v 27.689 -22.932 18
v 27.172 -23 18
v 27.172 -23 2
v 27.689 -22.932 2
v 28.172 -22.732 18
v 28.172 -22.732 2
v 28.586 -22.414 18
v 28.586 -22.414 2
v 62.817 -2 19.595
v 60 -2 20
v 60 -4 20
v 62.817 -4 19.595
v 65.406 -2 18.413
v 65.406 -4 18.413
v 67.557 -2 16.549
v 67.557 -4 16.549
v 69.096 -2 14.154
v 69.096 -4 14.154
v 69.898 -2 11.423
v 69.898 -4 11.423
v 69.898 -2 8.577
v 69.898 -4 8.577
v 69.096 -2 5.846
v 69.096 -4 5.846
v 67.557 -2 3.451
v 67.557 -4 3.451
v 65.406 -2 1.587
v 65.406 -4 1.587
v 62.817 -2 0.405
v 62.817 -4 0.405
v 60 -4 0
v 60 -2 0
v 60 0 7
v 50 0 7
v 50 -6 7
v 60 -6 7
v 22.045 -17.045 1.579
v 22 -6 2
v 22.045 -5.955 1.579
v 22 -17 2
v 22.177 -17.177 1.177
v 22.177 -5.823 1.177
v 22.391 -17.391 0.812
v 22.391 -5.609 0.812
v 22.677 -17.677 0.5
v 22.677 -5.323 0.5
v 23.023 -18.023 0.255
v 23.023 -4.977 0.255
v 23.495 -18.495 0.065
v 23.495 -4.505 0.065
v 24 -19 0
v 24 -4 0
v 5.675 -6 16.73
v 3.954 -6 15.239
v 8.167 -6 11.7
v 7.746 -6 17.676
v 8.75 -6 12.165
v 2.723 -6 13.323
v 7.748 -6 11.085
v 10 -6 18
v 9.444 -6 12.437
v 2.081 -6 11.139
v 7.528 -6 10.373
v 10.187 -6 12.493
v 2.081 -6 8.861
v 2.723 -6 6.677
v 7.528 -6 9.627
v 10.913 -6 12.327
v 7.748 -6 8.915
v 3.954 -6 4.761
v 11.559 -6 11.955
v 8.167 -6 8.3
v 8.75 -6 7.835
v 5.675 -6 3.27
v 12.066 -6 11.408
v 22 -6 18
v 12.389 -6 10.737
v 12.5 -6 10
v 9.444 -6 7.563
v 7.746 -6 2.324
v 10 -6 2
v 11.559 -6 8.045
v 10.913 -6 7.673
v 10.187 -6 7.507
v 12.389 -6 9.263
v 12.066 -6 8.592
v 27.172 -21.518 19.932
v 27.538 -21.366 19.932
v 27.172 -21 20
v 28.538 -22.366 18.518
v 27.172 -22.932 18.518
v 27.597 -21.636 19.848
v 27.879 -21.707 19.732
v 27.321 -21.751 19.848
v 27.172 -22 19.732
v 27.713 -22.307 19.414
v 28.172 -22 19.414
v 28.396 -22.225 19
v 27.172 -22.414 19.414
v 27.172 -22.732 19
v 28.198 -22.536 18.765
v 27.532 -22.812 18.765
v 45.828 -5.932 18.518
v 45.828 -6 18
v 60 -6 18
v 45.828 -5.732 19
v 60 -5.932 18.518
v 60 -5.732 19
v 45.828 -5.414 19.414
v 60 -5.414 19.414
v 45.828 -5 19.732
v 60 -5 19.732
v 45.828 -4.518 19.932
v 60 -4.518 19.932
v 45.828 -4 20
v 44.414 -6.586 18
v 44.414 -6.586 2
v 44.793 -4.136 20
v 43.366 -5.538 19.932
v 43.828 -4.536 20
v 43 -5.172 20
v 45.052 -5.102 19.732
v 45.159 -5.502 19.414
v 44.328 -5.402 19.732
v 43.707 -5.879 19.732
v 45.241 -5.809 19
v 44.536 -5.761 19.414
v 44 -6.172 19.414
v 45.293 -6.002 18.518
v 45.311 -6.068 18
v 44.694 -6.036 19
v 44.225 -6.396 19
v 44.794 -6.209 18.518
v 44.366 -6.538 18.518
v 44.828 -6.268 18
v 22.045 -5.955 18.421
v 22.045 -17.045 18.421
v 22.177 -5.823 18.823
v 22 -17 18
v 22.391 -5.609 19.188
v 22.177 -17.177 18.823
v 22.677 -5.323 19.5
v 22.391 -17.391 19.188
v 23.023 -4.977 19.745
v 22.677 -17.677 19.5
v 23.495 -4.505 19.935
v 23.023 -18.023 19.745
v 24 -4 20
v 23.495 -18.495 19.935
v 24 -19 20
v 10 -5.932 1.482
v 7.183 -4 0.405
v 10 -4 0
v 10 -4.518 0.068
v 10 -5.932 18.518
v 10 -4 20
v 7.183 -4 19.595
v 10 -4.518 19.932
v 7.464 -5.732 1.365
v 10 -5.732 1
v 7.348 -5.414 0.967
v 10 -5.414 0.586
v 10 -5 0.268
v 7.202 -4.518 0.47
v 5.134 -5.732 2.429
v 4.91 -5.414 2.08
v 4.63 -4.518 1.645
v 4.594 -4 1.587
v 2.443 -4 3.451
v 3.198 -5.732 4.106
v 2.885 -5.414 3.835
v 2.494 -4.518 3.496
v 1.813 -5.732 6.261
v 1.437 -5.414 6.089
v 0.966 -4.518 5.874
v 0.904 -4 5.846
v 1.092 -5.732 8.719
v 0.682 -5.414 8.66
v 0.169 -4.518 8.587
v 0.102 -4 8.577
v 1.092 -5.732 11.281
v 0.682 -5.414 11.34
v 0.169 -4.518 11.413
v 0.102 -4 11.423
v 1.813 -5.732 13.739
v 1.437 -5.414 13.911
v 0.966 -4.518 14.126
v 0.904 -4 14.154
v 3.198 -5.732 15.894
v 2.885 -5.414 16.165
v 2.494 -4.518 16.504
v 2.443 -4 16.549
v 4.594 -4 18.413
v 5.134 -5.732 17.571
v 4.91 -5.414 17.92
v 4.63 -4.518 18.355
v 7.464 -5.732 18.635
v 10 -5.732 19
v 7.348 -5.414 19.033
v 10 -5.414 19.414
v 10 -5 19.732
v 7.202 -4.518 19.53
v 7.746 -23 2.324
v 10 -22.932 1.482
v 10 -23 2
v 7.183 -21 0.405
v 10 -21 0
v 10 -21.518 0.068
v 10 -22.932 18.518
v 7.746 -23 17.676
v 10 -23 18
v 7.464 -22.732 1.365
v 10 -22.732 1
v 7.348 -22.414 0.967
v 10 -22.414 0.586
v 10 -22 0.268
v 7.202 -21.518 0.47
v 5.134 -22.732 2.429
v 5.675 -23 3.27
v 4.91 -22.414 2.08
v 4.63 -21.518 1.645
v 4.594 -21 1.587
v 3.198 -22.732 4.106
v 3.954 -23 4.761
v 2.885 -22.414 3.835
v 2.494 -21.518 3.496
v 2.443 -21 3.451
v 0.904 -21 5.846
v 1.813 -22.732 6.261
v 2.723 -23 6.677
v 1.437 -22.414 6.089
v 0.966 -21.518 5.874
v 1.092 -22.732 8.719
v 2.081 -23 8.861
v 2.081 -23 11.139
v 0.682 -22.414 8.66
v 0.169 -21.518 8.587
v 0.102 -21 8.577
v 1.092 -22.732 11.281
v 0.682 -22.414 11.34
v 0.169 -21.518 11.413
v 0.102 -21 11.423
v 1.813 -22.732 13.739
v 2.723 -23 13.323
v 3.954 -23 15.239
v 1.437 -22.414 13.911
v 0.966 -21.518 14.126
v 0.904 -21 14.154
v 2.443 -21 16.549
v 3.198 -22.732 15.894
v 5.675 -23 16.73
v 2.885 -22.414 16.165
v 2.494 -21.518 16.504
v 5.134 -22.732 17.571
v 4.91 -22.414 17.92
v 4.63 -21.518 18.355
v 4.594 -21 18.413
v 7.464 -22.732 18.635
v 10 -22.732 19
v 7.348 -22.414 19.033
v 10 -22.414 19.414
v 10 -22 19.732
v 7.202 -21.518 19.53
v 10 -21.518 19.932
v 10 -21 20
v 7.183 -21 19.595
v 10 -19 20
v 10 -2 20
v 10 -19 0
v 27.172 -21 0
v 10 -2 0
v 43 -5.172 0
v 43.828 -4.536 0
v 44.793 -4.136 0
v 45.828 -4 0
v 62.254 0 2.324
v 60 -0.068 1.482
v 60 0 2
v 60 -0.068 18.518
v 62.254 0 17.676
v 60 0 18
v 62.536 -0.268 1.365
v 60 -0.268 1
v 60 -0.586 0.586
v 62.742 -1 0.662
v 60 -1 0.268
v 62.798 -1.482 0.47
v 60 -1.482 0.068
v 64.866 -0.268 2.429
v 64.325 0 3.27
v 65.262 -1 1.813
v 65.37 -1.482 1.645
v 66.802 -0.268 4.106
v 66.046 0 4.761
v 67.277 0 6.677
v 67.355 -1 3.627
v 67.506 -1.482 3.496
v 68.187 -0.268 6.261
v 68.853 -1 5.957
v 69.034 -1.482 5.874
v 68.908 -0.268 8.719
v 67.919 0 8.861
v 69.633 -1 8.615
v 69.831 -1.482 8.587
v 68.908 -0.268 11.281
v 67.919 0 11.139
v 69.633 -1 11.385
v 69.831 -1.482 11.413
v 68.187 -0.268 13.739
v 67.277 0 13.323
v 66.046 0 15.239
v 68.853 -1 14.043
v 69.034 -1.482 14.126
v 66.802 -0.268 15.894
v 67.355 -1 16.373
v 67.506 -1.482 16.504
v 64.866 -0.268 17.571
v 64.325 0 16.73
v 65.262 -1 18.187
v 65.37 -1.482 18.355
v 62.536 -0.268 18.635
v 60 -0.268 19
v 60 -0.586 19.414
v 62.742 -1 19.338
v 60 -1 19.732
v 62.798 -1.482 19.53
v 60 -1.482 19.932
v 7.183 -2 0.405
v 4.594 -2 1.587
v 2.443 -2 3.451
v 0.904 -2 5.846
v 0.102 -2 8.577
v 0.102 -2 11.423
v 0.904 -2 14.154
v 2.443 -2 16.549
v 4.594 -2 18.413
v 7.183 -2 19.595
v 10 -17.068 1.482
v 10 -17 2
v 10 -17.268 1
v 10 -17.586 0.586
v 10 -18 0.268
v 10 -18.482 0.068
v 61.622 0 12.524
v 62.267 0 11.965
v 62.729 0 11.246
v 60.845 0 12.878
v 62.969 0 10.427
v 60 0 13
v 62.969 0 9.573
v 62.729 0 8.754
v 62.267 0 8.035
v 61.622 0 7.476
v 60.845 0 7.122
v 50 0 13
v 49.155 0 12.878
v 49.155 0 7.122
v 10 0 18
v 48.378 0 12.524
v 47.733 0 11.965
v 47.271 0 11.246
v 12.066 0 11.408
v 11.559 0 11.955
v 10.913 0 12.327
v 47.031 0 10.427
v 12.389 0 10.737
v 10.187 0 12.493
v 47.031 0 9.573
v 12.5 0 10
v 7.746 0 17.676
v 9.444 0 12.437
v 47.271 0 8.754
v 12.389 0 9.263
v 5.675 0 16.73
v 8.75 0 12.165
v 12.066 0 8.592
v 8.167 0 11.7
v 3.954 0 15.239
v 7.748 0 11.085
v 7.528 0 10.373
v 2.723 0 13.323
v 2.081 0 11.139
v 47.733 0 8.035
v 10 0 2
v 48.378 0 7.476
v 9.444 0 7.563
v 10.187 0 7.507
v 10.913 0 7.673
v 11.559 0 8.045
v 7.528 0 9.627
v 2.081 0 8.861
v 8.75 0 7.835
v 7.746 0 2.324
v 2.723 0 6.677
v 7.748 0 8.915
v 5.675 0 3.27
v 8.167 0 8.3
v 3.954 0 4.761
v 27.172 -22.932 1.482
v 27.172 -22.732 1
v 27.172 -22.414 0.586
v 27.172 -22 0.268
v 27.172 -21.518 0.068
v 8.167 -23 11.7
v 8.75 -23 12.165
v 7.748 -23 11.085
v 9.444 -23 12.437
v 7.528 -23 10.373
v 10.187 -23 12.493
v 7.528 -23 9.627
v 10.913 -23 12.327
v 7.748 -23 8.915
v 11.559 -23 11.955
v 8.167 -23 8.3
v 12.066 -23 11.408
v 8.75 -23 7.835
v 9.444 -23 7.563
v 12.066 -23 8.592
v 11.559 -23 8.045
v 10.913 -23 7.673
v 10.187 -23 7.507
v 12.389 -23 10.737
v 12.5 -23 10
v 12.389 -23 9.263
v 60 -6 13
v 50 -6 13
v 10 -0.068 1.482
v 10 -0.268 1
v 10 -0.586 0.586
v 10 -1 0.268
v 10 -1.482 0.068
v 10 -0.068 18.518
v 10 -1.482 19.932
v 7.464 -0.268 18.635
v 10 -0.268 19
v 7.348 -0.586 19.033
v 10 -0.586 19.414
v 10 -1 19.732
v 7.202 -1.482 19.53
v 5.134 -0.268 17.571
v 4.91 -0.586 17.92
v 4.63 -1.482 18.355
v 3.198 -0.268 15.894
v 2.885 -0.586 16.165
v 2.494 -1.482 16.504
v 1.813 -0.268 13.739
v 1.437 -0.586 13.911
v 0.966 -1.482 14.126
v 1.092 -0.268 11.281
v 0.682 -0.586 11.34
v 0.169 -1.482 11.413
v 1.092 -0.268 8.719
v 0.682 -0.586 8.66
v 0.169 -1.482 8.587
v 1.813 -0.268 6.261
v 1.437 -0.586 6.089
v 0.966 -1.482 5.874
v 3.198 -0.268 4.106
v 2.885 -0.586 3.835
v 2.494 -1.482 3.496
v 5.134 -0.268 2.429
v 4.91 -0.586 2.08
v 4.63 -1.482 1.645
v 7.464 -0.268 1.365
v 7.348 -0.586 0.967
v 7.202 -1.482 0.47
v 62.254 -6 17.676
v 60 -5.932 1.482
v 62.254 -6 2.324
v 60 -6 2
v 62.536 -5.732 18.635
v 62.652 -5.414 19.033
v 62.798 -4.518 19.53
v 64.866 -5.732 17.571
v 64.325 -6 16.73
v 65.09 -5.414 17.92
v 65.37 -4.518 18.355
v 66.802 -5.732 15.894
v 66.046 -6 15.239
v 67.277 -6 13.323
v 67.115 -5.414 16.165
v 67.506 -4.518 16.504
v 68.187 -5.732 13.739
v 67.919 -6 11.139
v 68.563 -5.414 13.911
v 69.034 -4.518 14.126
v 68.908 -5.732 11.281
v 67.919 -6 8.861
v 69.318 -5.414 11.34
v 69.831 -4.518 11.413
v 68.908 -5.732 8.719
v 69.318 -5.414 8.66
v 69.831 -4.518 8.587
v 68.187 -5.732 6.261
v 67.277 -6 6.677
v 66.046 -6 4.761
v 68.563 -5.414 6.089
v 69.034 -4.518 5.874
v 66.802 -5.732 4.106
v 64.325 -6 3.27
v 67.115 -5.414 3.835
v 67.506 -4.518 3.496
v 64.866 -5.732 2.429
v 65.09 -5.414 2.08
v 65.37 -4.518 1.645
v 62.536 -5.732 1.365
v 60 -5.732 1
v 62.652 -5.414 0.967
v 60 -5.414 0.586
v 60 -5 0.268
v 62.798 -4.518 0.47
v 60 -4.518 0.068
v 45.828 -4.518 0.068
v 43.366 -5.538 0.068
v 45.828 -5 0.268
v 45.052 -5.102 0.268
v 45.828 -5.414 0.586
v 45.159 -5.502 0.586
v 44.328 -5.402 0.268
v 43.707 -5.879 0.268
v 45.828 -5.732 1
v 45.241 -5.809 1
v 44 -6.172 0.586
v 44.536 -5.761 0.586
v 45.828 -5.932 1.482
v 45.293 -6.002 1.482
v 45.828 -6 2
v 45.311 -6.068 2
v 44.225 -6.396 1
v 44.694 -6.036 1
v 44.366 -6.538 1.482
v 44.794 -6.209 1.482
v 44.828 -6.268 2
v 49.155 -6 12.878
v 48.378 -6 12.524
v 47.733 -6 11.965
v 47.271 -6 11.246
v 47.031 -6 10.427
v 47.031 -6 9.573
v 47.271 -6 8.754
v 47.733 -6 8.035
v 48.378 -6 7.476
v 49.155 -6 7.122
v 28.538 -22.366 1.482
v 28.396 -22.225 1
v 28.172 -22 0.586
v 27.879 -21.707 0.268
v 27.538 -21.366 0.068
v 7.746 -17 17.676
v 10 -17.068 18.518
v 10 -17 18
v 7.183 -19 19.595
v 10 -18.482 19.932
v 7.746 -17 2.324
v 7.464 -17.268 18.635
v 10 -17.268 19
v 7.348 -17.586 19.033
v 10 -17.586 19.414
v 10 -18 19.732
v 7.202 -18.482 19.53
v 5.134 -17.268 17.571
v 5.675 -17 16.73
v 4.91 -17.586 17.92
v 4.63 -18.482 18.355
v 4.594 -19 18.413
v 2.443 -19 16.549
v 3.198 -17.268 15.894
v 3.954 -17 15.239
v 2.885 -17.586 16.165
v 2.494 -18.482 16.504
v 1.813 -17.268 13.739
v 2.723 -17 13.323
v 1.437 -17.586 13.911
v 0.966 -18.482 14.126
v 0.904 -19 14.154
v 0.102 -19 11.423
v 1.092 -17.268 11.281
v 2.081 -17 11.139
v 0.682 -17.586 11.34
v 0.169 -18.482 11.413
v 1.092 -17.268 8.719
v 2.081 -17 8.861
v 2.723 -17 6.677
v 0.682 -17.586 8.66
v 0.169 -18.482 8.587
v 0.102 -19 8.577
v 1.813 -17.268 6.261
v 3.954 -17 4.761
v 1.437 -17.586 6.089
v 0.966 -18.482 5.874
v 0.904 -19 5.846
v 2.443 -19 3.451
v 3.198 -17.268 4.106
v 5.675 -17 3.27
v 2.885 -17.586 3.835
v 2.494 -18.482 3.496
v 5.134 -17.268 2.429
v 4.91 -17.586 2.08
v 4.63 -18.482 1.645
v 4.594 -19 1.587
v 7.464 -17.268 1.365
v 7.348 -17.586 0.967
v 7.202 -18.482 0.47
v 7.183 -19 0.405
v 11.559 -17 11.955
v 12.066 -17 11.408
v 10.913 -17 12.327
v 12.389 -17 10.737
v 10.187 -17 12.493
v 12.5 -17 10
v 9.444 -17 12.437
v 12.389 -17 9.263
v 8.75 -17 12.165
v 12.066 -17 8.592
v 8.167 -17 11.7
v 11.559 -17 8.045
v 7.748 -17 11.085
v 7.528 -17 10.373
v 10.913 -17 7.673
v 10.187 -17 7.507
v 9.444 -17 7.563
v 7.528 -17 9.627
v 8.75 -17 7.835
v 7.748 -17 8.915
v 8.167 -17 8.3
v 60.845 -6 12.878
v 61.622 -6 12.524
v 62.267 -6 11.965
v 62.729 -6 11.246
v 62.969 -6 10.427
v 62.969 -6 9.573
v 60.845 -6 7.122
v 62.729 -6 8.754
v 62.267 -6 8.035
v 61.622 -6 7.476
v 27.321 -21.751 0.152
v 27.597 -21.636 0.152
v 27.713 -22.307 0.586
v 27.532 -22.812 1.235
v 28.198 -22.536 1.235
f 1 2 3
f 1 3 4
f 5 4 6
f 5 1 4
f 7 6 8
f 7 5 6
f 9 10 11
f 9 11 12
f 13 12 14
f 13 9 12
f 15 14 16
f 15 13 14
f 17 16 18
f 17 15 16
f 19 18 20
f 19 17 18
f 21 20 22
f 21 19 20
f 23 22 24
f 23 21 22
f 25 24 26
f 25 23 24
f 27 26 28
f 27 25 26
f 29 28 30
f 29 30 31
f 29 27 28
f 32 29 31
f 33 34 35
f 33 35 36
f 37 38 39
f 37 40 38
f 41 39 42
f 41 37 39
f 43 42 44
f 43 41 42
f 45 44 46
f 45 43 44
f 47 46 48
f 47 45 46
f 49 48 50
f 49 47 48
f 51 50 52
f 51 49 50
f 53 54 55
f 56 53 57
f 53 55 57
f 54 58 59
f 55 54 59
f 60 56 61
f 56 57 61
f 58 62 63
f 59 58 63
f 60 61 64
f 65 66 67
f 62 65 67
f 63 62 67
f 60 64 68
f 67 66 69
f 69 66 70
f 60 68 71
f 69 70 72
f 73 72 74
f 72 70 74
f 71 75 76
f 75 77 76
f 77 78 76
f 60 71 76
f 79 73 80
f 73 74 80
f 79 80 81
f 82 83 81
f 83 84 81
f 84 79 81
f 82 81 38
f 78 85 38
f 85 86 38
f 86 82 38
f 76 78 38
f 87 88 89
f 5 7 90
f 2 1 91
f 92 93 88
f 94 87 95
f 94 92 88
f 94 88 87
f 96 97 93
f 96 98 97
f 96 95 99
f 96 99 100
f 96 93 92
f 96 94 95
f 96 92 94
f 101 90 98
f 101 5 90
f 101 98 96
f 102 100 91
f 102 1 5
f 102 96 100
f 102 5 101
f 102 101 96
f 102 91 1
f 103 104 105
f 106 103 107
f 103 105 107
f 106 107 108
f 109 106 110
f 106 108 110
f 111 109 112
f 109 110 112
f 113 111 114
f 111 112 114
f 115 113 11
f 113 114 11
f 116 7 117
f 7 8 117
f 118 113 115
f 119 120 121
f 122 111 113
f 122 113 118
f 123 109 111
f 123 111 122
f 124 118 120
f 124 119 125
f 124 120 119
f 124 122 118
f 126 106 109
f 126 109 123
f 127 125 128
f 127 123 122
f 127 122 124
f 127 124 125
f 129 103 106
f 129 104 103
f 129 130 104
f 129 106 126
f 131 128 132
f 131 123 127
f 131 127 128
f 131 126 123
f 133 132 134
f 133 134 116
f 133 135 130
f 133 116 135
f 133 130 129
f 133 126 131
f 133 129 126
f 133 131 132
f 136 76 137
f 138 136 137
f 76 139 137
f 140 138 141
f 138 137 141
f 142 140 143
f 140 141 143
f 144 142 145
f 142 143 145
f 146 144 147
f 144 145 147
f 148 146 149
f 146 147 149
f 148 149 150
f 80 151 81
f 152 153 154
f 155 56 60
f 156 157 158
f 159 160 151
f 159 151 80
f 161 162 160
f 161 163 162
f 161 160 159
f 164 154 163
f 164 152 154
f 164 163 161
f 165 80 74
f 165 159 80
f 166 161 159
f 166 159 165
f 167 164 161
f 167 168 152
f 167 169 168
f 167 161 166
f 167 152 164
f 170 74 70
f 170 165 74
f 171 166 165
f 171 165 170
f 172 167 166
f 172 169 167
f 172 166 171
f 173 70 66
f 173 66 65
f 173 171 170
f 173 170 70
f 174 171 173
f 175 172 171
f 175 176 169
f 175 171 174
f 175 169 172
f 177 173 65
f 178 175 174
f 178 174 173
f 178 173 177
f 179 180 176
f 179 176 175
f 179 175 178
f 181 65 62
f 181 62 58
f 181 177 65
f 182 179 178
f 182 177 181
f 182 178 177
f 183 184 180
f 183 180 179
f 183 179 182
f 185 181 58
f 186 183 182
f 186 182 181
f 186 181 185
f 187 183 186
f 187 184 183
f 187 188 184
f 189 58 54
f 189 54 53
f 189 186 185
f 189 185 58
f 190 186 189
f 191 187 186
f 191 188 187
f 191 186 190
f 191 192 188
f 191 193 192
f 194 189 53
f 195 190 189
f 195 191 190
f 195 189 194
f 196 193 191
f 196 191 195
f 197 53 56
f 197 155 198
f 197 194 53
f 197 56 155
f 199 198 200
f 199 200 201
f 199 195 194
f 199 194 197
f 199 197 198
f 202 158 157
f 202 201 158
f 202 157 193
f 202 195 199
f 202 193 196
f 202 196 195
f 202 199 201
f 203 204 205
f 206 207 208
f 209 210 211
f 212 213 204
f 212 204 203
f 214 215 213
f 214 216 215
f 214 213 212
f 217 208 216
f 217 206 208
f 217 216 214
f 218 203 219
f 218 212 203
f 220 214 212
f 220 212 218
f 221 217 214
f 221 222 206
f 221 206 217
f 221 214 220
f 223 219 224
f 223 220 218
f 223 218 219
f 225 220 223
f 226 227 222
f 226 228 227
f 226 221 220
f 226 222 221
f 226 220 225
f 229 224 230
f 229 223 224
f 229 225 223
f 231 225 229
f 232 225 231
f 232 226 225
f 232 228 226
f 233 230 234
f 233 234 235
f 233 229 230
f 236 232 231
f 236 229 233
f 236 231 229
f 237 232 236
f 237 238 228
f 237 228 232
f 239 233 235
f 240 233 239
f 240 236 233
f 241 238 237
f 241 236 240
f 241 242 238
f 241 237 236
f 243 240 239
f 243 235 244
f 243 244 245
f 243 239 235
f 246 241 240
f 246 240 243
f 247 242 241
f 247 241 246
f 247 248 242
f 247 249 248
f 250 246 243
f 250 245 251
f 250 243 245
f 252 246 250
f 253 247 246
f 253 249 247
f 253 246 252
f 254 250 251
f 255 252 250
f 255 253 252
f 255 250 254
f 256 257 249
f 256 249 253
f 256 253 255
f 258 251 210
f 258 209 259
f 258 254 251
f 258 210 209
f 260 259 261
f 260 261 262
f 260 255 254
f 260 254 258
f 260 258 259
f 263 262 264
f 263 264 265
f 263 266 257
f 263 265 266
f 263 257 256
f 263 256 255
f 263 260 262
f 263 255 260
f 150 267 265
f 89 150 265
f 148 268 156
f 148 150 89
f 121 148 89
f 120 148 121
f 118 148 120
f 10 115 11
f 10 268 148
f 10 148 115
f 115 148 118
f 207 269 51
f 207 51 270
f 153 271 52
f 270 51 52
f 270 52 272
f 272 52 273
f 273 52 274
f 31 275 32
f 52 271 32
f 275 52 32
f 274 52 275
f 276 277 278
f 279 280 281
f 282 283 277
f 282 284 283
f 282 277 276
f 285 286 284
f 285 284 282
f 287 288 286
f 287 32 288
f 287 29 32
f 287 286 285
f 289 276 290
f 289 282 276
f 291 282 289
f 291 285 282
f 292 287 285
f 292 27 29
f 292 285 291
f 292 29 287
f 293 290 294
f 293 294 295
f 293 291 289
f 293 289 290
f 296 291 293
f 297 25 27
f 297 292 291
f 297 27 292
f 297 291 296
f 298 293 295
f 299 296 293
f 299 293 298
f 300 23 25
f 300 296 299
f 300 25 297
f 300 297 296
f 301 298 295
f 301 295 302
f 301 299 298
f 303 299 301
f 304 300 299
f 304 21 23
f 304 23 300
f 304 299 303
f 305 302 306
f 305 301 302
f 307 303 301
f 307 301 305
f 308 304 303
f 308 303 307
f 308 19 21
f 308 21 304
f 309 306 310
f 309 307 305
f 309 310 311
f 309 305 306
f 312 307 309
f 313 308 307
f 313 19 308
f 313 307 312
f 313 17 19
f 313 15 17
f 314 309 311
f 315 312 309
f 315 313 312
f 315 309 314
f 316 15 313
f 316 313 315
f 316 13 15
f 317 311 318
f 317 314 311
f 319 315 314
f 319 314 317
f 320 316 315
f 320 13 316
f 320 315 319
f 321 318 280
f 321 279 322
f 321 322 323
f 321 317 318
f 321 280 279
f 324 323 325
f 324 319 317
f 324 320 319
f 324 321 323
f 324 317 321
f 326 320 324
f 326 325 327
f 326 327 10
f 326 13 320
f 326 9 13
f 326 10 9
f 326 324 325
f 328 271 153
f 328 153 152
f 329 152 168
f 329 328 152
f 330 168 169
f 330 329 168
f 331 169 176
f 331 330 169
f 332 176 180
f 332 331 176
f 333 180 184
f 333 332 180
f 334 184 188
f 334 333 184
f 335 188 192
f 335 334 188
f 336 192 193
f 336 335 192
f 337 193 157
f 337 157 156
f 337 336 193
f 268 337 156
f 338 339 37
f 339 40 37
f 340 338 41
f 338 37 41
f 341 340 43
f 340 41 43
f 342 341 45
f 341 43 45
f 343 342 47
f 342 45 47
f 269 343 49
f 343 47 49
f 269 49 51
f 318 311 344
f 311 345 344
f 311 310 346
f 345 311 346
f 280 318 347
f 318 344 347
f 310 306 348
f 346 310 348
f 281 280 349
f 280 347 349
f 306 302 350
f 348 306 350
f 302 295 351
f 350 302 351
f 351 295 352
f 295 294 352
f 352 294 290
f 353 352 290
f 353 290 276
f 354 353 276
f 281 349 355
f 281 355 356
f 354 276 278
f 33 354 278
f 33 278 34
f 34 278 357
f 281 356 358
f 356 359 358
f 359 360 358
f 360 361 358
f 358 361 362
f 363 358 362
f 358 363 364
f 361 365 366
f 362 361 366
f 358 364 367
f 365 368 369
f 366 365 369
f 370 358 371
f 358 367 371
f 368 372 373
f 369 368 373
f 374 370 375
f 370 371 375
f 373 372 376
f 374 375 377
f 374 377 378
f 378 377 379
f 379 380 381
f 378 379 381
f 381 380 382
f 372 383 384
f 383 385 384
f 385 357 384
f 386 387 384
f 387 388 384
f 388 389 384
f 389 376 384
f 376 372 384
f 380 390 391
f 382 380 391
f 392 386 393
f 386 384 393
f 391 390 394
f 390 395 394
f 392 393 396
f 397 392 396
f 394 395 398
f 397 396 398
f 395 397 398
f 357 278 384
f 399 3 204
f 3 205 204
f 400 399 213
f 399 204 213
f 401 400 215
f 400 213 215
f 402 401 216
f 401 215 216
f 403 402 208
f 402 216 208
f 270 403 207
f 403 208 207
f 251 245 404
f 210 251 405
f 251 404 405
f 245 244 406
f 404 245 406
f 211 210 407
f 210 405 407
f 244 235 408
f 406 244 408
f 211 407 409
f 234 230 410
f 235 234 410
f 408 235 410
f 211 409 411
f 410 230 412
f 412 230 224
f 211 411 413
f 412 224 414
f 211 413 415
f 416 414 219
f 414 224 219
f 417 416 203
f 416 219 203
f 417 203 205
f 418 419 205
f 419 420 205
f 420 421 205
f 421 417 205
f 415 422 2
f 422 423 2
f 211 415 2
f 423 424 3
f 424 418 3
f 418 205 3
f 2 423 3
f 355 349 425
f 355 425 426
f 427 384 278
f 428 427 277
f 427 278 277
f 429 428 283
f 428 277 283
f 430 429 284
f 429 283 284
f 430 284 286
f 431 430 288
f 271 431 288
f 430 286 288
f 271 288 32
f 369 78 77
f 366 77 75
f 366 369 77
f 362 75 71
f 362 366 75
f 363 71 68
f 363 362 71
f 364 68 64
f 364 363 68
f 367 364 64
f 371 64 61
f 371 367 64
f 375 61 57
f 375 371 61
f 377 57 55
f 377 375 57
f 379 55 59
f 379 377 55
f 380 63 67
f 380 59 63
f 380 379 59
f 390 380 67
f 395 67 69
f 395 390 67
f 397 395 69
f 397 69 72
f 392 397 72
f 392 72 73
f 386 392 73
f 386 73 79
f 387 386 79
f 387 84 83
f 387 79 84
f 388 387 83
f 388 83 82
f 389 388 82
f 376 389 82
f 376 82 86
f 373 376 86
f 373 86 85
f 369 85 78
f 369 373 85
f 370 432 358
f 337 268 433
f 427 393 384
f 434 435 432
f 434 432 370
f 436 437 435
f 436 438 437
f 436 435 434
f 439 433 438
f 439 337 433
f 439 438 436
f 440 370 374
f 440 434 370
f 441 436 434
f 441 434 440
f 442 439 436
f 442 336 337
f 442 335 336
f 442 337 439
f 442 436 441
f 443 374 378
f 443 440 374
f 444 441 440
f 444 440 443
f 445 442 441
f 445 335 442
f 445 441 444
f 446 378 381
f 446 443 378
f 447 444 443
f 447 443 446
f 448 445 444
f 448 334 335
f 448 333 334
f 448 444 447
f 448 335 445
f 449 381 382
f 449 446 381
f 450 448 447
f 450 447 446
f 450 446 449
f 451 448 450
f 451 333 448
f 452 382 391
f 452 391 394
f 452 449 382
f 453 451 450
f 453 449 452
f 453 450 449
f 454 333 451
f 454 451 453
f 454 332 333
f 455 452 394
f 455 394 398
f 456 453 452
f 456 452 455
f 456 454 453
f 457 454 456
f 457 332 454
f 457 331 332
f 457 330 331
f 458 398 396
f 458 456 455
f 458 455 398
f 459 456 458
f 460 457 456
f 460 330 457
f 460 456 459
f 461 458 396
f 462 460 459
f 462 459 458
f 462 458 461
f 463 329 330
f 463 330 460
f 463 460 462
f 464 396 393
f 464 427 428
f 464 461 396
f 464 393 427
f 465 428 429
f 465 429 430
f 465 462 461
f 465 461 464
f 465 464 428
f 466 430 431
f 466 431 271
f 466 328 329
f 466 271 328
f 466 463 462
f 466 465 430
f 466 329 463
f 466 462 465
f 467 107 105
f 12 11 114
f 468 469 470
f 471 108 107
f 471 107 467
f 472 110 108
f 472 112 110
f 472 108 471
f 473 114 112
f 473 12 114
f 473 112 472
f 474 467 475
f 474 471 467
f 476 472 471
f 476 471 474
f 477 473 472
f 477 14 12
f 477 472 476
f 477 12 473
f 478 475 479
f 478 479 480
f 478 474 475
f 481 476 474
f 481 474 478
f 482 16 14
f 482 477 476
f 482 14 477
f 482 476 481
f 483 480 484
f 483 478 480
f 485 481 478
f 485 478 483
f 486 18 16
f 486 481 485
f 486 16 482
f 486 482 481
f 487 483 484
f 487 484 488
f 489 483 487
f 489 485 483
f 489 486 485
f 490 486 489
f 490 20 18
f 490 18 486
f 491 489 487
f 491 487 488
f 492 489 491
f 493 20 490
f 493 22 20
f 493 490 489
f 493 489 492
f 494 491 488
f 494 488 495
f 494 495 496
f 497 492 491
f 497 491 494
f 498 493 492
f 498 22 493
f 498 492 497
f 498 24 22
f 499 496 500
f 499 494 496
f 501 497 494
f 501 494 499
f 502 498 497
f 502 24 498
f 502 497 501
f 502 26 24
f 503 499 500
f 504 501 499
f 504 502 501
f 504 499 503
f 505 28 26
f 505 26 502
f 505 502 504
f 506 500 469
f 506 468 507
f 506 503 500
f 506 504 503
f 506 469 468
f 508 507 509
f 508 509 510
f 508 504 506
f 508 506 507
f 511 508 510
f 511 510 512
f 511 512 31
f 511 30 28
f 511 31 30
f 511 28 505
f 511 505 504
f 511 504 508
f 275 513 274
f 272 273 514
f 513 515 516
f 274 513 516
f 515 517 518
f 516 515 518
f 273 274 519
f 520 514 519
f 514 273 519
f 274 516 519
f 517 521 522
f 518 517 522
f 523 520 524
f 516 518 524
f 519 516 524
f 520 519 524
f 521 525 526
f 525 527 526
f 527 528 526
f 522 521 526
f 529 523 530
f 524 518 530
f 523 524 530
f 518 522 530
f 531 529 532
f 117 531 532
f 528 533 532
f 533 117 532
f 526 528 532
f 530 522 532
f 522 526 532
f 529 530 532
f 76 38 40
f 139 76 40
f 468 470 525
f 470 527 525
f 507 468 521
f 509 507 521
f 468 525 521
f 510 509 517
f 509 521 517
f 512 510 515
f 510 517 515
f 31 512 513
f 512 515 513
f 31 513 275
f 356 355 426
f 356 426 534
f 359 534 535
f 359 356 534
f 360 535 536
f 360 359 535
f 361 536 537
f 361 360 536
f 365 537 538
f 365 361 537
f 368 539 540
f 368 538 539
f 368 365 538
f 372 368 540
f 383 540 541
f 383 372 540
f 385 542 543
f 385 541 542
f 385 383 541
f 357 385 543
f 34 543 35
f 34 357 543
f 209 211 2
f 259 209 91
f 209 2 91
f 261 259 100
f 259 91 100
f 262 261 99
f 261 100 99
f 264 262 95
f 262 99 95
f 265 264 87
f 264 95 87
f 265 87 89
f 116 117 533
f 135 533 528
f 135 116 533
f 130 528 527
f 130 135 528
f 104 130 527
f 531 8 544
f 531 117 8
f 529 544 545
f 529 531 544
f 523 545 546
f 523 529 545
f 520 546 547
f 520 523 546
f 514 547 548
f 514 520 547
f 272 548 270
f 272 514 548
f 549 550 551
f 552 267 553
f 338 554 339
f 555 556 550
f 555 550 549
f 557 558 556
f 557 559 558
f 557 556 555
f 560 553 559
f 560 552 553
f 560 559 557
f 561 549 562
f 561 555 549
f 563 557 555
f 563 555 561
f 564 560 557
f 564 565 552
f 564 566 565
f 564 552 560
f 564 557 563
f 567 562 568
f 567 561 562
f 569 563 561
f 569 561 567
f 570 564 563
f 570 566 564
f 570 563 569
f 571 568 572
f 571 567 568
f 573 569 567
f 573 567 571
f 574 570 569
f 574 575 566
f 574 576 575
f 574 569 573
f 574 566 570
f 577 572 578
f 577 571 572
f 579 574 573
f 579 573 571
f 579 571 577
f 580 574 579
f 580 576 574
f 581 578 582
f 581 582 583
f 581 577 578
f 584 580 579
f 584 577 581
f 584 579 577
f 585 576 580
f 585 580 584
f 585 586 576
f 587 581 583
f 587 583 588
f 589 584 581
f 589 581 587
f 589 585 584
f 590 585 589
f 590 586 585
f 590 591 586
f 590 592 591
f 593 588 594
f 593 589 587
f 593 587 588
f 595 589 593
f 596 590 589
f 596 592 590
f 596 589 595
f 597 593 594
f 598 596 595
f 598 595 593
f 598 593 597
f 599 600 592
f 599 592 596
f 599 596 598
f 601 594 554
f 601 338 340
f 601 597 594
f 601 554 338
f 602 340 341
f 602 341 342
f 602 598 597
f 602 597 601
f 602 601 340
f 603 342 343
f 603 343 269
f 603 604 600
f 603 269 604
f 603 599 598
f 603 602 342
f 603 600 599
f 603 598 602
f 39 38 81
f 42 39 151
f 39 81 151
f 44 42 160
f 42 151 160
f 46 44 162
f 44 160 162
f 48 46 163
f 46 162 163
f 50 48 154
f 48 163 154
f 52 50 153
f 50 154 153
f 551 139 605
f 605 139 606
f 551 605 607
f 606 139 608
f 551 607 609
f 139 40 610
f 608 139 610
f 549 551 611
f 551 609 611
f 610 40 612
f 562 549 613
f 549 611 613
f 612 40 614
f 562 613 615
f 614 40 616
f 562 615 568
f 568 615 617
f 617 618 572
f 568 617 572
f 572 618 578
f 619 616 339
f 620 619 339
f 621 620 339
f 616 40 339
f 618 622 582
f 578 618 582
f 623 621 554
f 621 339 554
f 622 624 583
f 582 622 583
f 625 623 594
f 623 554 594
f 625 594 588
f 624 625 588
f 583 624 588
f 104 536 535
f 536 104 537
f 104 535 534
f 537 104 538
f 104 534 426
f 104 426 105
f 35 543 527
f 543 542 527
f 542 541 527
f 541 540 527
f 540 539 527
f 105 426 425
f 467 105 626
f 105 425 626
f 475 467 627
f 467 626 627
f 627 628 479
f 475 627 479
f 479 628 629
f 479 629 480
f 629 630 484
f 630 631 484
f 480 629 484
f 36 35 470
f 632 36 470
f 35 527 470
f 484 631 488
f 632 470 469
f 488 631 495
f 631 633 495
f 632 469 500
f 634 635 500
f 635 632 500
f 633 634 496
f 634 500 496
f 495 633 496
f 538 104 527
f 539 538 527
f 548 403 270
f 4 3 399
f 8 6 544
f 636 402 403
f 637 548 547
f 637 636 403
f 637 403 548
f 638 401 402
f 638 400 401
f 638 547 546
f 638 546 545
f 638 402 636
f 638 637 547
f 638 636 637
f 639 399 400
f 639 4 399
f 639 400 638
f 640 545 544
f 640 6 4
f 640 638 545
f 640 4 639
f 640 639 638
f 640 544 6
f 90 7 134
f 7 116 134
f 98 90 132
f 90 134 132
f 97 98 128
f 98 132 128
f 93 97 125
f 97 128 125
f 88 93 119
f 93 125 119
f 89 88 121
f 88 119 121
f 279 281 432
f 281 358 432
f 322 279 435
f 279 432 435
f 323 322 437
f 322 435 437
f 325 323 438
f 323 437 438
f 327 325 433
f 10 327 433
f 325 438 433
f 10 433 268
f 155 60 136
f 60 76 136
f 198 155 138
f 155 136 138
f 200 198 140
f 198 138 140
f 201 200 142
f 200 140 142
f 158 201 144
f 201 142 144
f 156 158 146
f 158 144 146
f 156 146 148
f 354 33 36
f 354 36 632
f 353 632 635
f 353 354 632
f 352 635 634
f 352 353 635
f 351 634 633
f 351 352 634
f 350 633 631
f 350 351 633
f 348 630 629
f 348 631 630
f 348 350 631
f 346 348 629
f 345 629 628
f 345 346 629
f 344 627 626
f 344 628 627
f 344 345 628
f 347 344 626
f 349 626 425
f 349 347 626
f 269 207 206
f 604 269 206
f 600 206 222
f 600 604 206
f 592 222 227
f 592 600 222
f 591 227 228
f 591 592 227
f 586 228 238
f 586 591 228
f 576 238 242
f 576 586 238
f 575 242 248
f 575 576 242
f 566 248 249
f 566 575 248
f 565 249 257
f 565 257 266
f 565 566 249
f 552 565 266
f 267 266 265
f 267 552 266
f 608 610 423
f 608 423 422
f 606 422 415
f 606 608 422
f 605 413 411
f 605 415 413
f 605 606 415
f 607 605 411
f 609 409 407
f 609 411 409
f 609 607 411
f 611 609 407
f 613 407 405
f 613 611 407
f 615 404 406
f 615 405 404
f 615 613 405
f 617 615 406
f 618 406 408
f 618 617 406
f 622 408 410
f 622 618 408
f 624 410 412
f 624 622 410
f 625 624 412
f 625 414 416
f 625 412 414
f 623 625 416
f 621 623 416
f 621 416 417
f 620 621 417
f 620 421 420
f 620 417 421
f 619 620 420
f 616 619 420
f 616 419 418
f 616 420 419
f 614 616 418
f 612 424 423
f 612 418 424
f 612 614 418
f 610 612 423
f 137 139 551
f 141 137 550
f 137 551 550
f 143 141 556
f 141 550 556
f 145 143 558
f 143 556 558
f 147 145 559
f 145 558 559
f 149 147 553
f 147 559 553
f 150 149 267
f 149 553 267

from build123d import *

# Parameters (mm, degrees)
F1_DEPTH = 20
F2_R     = 2.5
F3_DEPTH = 25
F4_R     = 2


with BuildPart() as f1:
    # F0 (on Top) → F1 (new body)
    with BuildSketch(Plane.XY):
        Polygon((70, 0), (0, 0), (0, -6), (22, -6), (22, -17), (0, -17), (0, -23), (28, -23), (45, -6), (70, -6), align=None)
    extrude(amount=F1_DEPTH)

    # F2 (on Front) → F3 (cut)
    with BuildSketch(Plane.XZ):
        with BuildLine():
            Line((72, 20), (60, 20))
            ThreePointArc((60, 20), (70, 10), (60, 0))
            Line((60, 0), (72, 0))
            Line((72, 0), (72, 20))
        make_face()
        with BuildLine():
            ThreePointArc((10, 0), (0, 10), (10, 20))
            Line((10, 20), (-2, 20))
            Line((-2, 20), (-2, 0))
            Line((-2, 0), (10, 0))
        make_face()
        with BuildLine():
            Line((50, 7), (60, 7))
            ThreePointArc((60, 7), (63, 10), (60, 13))
            Line((60, 13), (50, 13))
            ThreePointArc((50, 13), (47, 10), (50, 7))
        make_face()
        with Locations((10, 10)):
            Circle(F2_R)
    extrude(amount=F3_DEPTH, mode=Mode.SUBTRACT)

    # F4
    f4_edges = [f1.edges().sort_by_distance(p)[0] for p in [
        (60, -3, 20),
        (52.5, -6, 20),
        (36.5, -14.5, 20),
        (19, -23, 20),
        (10, -20, 20),
        (16, -17, 20),
        (22, -11.5, 20),
        (16, -6, 20),
        (10, -3, 20),
        (35, 0, 20),
        (36.5, -14.5, 0),
        (45, -6, 10),
        (28, -23, 10),
        (22, -11.5, 0),
    ]]
    fillet(f4_edges, radius=F4_R)


solid = f1.part
